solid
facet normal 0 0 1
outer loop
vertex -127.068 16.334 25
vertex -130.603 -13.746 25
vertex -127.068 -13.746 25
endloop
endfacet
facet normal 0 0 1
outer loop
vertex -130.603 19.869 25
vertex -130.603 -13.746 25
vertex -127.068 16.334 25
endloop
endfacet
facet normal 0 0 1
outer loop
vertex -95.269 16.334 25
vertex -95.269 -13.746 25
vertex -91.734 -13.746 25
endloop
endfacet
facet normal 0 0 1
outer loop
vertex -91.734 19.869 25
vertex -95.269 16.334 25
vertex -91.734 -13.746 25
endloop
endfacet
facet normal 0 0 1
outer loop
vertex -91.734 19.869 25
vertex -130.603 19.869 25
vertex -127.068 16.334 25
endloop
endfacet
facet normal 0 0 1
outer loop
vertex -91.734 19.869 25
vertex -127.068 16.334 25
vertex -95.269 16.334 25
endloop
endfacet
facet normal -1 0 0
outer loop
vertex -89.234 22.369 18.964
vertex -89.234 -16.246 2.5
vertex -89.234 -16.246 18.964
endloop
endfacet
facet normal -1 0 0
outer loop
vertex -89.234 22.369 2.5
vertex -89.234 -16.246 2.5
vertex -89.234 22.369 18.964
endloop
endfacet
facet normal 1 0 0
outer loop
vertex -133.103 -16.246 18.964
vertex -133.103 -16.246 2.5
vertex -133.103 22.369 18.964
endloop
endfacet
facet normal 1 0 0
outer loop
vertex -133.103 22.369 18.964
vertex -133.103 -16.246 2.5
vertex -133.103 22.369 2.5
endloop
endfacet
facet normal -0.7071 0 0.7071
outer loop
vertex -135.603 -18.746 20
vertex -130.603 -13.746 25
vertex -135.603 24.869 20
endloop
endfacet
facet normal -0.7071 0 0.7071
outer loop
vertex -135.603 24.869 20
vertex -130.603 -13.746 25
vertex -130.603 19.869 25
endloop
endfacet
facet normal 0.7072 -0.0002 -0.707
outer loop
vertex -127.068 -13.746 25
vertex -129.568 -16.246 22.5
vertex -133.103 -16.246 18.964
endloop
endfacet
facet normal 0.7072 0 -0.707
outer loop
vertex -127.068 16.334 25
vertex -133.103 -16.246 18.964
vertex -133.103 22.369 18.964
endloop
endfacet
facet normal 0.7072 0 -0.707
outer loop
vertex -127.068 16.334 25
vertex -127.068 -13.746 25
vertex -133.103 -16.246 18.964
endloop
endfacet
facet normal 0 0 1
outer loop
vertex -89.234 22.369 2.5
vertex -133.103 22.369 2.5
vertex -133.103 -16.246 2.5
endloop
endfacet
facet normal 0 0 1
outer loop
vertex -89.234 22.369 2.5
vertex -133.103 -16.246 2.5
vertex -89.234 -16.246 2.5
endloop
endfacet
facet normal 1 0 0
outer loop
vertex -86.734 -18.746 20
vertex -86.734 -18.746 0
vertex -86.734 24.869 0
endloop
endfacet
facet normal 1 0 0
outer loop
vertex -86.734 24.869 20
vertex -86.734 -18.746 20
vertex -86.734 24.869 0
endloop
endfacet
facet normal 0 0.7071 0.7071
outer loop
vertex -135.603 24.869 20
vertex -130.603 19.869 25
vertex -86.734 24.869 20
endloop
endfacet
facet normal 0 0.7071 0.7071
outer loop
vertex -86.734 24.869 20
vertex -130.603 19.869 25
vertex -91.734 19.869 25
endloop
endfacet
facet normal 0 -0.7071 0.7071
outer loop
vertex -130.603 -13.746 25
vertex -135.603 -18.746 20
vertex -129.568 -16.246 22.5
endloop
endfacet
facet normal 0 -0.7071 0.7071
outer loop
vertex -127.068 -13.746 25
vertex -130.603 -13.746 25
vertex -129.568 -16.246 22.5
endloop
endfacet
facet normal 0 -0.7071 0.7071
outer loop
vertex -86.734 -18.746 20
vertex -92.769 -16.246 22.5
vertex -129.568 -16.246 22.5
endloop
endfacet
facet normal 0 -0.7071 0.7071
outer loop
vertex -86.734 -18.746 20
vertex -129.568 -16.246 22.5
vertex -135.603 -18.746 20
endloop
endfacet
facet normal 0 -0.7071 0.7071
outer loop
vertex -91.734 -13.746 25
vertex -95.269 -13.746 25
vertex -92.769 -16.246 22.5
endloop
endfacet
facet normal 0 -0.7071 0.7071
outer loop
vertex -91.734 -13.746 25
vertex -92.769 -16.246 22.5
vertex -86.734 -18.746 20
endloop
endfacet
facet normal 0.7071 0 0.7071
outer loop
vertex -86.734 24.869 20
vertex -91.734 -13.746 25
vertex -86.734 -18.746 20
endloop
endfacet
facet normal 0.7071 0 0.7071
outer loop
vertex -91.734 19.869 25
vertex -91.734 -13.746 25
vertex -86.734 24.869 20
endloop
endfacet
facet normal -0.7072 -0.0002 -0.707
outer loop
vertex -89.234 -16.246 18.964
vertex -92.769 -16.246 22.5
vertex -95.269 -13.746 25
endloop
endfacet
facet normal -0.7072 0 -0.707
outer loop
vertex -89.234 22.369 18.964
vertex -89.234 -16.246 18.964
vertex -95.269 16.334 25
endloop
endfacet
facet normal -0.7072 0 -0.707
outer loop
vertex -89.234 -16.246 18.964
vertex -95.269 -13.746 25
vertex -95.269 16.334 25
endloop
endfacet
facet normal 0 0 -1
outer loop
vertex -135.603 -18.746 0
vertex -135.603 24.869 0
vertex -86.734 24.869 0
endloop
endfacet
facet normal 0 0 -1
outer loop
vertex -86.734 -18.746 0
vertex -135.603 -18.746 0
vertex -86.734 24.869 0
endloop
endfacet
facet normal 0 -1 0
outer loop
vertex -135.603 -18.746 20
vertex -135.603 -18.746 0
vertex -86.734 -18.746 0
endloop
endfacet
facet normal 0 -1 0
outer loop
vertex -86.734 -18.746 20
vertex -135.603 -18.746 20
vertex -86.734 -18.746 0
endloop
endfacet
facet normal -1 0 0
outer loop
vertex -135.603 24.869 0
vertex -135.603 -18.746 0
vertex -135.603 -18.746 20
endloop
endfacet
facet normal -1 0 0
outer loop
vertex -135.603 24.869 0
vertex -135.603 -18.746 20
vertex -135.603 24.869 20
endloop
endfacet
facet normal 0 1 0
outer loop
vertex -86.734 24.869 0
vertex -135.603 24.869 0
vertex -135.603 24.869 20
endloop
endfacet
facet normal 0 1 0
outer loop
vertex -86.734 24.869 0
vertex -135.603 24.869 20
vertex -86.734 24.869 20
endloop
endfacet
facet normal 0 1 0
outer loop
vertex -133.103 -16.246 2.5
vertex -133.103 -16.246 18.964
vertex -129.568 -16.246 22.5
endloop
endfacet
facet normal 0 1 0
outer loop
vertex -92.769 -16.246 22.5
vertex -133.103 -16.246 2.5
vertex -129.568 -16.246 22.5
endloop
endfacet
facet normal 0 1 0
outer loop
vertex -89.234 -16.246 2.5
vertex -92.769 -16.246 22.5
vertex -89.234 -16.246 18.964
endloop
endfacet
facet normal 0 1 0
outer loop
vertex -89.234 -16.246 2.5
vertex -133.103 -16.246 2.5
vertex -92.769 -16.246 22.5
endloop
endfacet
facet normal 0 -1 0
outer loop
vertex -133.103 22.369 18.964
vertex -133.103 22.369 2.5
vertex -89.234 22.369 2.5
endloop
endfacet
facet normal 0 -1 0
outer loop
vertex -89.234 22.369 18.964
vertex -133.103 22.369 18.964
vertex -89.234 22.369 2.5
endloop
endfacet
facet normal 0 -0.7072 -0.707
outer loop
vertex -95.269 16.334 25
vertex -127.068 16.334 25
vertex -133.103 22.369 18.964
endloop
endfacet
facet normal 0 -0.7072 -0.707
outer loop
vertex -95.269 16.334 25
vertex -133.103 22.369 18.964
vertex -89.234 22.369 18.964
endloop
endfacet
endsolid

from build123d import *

# Parameters (mm, degrees)
F0_W     = 48.8697811961
F0_H     = 43.6150431633
F1_DEPTH = 25
F2_SIZE  = 5
F3_T     = -2.5


with BuildPart() as f1:
    # F0 (on Top) → F1 (new body)
    with BuildSketch(Plane.XY):
        with Locations((-111.1685223877, 3.0619557947)):
            Rectangle(F0_W, F0_H)
    extrude(amount=F1_DEPTH)

    # F2
    f2_edges = [f1.edges().sort_by_distance(p)[0] for p in [
        (-111.168522, 24.869477, 25),
        (-135.603413, 3.061956, 25),
        (-111.168522, -18.745566, 25),
        (-86.733632, 3.061956, 25),
    ]]
    chamfer(f2_edges, length=F2_SIZE)

    # F3
    f3_openings = [f1.faces().sort_by_distance(p)[0] for p in [
        (-111.168522, -16.340544, 22.405022),
        (-111.168522, 3.061956, 25),
    ]]
    offset(amount=F3_T, openings=f3_openings)


solid = f1.part
